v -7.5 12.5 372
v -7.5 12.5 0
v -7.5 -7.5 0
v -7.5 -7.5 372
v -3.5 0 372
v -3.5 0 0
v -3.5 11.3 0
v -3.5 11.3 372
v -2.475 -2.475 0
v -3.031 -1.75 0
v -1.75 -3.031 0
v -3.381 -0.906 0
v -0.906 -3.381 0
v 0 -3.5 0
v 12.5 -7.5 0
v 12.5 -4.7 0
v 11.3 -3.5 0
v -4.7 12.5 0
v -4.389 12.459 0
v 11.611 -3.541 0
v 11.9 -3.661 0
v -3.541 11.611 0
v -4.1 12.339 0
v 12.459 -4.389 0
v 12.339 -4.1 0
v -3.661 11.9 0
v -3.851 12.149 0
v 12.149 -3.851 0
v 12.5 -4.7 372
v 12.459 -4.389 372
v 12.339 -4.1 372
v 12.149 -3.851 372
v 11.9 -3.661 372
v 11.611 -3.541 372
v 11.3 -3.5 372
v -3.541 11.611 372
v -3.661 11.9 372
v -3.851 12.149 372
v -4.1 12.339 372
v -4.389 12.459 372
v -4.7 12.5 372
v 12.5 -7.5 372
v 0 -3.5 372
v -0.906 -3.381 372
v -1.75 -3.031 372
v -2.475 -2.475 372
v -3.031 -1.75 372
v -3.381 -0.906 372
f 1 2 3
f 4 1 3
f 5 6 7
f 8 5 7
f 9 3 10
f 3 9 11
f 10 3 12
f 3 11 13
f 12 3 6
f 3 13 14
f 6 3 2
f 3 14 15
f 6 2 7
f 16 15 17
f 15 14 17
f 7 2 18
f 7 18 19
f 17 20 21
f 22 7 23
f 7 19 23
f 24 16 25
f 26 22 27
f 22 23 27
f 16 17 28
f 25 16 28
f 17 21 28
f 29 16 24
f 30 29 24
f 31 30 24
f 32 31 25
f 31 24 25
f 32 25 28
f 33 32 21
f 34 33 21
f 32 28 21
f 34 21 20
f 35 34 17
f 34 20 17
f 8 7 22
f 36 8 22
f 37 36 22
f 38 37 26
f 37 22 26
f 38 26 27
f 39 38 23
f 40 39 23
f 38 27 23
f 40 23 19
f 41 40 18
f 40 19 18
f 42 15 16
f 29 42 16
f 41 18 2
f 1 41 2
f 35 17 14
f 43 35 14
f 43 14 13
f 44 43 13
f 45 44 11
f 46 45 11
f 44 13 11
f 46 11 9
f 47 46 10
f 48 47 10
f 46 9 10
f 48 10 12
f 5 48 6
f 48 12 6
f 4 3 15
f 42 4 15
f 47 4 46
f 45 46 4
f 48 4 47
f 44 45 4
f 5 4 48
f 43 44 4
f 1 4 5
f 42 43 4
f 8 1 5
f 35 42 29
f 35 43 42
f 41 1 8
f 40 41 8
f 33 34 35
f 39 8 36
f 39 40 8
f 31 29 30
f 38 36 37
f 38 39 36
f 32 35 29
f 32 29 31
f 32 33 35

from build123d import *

# Parameters (mm, degrees)
EXTRUDE_1_DEPTH = 372


with BuildPart() as part:
    # Эскиз1 → Бобышка-Вытянуть1 (new body)
    with BuildSketch(Plane.XY):
        with BuildLine():
            Line((-7.5, 12.5), (-7.5, -7.5))
            Line((-7.5, -7.5), (12.5, -7.5))
            Line((12.5, -7.5), (12.5, -4.7))
            ThreePointArc((12.5, -4.7), (12.148528137, -3.851471863), (11.3, -3.5))
            Line((11.3, -3.5), (0, -3.5))
            ThreePointArc((0, -3.5), (-2.474873734, -2.474873734), (-3.5, 0))
            Line((-3.5, 0), (-3.5, 11.3))
            ThreePointArc((-3.5, 11.3), (-3.851471863, 12.148528137), (-4.7, 12.5))
            Line((-4.7, 12.5), (-7.5, 12.5))
        make_face()
    extrude(amount=EXTRUDE_1_DEPTH)


solid = part.part
